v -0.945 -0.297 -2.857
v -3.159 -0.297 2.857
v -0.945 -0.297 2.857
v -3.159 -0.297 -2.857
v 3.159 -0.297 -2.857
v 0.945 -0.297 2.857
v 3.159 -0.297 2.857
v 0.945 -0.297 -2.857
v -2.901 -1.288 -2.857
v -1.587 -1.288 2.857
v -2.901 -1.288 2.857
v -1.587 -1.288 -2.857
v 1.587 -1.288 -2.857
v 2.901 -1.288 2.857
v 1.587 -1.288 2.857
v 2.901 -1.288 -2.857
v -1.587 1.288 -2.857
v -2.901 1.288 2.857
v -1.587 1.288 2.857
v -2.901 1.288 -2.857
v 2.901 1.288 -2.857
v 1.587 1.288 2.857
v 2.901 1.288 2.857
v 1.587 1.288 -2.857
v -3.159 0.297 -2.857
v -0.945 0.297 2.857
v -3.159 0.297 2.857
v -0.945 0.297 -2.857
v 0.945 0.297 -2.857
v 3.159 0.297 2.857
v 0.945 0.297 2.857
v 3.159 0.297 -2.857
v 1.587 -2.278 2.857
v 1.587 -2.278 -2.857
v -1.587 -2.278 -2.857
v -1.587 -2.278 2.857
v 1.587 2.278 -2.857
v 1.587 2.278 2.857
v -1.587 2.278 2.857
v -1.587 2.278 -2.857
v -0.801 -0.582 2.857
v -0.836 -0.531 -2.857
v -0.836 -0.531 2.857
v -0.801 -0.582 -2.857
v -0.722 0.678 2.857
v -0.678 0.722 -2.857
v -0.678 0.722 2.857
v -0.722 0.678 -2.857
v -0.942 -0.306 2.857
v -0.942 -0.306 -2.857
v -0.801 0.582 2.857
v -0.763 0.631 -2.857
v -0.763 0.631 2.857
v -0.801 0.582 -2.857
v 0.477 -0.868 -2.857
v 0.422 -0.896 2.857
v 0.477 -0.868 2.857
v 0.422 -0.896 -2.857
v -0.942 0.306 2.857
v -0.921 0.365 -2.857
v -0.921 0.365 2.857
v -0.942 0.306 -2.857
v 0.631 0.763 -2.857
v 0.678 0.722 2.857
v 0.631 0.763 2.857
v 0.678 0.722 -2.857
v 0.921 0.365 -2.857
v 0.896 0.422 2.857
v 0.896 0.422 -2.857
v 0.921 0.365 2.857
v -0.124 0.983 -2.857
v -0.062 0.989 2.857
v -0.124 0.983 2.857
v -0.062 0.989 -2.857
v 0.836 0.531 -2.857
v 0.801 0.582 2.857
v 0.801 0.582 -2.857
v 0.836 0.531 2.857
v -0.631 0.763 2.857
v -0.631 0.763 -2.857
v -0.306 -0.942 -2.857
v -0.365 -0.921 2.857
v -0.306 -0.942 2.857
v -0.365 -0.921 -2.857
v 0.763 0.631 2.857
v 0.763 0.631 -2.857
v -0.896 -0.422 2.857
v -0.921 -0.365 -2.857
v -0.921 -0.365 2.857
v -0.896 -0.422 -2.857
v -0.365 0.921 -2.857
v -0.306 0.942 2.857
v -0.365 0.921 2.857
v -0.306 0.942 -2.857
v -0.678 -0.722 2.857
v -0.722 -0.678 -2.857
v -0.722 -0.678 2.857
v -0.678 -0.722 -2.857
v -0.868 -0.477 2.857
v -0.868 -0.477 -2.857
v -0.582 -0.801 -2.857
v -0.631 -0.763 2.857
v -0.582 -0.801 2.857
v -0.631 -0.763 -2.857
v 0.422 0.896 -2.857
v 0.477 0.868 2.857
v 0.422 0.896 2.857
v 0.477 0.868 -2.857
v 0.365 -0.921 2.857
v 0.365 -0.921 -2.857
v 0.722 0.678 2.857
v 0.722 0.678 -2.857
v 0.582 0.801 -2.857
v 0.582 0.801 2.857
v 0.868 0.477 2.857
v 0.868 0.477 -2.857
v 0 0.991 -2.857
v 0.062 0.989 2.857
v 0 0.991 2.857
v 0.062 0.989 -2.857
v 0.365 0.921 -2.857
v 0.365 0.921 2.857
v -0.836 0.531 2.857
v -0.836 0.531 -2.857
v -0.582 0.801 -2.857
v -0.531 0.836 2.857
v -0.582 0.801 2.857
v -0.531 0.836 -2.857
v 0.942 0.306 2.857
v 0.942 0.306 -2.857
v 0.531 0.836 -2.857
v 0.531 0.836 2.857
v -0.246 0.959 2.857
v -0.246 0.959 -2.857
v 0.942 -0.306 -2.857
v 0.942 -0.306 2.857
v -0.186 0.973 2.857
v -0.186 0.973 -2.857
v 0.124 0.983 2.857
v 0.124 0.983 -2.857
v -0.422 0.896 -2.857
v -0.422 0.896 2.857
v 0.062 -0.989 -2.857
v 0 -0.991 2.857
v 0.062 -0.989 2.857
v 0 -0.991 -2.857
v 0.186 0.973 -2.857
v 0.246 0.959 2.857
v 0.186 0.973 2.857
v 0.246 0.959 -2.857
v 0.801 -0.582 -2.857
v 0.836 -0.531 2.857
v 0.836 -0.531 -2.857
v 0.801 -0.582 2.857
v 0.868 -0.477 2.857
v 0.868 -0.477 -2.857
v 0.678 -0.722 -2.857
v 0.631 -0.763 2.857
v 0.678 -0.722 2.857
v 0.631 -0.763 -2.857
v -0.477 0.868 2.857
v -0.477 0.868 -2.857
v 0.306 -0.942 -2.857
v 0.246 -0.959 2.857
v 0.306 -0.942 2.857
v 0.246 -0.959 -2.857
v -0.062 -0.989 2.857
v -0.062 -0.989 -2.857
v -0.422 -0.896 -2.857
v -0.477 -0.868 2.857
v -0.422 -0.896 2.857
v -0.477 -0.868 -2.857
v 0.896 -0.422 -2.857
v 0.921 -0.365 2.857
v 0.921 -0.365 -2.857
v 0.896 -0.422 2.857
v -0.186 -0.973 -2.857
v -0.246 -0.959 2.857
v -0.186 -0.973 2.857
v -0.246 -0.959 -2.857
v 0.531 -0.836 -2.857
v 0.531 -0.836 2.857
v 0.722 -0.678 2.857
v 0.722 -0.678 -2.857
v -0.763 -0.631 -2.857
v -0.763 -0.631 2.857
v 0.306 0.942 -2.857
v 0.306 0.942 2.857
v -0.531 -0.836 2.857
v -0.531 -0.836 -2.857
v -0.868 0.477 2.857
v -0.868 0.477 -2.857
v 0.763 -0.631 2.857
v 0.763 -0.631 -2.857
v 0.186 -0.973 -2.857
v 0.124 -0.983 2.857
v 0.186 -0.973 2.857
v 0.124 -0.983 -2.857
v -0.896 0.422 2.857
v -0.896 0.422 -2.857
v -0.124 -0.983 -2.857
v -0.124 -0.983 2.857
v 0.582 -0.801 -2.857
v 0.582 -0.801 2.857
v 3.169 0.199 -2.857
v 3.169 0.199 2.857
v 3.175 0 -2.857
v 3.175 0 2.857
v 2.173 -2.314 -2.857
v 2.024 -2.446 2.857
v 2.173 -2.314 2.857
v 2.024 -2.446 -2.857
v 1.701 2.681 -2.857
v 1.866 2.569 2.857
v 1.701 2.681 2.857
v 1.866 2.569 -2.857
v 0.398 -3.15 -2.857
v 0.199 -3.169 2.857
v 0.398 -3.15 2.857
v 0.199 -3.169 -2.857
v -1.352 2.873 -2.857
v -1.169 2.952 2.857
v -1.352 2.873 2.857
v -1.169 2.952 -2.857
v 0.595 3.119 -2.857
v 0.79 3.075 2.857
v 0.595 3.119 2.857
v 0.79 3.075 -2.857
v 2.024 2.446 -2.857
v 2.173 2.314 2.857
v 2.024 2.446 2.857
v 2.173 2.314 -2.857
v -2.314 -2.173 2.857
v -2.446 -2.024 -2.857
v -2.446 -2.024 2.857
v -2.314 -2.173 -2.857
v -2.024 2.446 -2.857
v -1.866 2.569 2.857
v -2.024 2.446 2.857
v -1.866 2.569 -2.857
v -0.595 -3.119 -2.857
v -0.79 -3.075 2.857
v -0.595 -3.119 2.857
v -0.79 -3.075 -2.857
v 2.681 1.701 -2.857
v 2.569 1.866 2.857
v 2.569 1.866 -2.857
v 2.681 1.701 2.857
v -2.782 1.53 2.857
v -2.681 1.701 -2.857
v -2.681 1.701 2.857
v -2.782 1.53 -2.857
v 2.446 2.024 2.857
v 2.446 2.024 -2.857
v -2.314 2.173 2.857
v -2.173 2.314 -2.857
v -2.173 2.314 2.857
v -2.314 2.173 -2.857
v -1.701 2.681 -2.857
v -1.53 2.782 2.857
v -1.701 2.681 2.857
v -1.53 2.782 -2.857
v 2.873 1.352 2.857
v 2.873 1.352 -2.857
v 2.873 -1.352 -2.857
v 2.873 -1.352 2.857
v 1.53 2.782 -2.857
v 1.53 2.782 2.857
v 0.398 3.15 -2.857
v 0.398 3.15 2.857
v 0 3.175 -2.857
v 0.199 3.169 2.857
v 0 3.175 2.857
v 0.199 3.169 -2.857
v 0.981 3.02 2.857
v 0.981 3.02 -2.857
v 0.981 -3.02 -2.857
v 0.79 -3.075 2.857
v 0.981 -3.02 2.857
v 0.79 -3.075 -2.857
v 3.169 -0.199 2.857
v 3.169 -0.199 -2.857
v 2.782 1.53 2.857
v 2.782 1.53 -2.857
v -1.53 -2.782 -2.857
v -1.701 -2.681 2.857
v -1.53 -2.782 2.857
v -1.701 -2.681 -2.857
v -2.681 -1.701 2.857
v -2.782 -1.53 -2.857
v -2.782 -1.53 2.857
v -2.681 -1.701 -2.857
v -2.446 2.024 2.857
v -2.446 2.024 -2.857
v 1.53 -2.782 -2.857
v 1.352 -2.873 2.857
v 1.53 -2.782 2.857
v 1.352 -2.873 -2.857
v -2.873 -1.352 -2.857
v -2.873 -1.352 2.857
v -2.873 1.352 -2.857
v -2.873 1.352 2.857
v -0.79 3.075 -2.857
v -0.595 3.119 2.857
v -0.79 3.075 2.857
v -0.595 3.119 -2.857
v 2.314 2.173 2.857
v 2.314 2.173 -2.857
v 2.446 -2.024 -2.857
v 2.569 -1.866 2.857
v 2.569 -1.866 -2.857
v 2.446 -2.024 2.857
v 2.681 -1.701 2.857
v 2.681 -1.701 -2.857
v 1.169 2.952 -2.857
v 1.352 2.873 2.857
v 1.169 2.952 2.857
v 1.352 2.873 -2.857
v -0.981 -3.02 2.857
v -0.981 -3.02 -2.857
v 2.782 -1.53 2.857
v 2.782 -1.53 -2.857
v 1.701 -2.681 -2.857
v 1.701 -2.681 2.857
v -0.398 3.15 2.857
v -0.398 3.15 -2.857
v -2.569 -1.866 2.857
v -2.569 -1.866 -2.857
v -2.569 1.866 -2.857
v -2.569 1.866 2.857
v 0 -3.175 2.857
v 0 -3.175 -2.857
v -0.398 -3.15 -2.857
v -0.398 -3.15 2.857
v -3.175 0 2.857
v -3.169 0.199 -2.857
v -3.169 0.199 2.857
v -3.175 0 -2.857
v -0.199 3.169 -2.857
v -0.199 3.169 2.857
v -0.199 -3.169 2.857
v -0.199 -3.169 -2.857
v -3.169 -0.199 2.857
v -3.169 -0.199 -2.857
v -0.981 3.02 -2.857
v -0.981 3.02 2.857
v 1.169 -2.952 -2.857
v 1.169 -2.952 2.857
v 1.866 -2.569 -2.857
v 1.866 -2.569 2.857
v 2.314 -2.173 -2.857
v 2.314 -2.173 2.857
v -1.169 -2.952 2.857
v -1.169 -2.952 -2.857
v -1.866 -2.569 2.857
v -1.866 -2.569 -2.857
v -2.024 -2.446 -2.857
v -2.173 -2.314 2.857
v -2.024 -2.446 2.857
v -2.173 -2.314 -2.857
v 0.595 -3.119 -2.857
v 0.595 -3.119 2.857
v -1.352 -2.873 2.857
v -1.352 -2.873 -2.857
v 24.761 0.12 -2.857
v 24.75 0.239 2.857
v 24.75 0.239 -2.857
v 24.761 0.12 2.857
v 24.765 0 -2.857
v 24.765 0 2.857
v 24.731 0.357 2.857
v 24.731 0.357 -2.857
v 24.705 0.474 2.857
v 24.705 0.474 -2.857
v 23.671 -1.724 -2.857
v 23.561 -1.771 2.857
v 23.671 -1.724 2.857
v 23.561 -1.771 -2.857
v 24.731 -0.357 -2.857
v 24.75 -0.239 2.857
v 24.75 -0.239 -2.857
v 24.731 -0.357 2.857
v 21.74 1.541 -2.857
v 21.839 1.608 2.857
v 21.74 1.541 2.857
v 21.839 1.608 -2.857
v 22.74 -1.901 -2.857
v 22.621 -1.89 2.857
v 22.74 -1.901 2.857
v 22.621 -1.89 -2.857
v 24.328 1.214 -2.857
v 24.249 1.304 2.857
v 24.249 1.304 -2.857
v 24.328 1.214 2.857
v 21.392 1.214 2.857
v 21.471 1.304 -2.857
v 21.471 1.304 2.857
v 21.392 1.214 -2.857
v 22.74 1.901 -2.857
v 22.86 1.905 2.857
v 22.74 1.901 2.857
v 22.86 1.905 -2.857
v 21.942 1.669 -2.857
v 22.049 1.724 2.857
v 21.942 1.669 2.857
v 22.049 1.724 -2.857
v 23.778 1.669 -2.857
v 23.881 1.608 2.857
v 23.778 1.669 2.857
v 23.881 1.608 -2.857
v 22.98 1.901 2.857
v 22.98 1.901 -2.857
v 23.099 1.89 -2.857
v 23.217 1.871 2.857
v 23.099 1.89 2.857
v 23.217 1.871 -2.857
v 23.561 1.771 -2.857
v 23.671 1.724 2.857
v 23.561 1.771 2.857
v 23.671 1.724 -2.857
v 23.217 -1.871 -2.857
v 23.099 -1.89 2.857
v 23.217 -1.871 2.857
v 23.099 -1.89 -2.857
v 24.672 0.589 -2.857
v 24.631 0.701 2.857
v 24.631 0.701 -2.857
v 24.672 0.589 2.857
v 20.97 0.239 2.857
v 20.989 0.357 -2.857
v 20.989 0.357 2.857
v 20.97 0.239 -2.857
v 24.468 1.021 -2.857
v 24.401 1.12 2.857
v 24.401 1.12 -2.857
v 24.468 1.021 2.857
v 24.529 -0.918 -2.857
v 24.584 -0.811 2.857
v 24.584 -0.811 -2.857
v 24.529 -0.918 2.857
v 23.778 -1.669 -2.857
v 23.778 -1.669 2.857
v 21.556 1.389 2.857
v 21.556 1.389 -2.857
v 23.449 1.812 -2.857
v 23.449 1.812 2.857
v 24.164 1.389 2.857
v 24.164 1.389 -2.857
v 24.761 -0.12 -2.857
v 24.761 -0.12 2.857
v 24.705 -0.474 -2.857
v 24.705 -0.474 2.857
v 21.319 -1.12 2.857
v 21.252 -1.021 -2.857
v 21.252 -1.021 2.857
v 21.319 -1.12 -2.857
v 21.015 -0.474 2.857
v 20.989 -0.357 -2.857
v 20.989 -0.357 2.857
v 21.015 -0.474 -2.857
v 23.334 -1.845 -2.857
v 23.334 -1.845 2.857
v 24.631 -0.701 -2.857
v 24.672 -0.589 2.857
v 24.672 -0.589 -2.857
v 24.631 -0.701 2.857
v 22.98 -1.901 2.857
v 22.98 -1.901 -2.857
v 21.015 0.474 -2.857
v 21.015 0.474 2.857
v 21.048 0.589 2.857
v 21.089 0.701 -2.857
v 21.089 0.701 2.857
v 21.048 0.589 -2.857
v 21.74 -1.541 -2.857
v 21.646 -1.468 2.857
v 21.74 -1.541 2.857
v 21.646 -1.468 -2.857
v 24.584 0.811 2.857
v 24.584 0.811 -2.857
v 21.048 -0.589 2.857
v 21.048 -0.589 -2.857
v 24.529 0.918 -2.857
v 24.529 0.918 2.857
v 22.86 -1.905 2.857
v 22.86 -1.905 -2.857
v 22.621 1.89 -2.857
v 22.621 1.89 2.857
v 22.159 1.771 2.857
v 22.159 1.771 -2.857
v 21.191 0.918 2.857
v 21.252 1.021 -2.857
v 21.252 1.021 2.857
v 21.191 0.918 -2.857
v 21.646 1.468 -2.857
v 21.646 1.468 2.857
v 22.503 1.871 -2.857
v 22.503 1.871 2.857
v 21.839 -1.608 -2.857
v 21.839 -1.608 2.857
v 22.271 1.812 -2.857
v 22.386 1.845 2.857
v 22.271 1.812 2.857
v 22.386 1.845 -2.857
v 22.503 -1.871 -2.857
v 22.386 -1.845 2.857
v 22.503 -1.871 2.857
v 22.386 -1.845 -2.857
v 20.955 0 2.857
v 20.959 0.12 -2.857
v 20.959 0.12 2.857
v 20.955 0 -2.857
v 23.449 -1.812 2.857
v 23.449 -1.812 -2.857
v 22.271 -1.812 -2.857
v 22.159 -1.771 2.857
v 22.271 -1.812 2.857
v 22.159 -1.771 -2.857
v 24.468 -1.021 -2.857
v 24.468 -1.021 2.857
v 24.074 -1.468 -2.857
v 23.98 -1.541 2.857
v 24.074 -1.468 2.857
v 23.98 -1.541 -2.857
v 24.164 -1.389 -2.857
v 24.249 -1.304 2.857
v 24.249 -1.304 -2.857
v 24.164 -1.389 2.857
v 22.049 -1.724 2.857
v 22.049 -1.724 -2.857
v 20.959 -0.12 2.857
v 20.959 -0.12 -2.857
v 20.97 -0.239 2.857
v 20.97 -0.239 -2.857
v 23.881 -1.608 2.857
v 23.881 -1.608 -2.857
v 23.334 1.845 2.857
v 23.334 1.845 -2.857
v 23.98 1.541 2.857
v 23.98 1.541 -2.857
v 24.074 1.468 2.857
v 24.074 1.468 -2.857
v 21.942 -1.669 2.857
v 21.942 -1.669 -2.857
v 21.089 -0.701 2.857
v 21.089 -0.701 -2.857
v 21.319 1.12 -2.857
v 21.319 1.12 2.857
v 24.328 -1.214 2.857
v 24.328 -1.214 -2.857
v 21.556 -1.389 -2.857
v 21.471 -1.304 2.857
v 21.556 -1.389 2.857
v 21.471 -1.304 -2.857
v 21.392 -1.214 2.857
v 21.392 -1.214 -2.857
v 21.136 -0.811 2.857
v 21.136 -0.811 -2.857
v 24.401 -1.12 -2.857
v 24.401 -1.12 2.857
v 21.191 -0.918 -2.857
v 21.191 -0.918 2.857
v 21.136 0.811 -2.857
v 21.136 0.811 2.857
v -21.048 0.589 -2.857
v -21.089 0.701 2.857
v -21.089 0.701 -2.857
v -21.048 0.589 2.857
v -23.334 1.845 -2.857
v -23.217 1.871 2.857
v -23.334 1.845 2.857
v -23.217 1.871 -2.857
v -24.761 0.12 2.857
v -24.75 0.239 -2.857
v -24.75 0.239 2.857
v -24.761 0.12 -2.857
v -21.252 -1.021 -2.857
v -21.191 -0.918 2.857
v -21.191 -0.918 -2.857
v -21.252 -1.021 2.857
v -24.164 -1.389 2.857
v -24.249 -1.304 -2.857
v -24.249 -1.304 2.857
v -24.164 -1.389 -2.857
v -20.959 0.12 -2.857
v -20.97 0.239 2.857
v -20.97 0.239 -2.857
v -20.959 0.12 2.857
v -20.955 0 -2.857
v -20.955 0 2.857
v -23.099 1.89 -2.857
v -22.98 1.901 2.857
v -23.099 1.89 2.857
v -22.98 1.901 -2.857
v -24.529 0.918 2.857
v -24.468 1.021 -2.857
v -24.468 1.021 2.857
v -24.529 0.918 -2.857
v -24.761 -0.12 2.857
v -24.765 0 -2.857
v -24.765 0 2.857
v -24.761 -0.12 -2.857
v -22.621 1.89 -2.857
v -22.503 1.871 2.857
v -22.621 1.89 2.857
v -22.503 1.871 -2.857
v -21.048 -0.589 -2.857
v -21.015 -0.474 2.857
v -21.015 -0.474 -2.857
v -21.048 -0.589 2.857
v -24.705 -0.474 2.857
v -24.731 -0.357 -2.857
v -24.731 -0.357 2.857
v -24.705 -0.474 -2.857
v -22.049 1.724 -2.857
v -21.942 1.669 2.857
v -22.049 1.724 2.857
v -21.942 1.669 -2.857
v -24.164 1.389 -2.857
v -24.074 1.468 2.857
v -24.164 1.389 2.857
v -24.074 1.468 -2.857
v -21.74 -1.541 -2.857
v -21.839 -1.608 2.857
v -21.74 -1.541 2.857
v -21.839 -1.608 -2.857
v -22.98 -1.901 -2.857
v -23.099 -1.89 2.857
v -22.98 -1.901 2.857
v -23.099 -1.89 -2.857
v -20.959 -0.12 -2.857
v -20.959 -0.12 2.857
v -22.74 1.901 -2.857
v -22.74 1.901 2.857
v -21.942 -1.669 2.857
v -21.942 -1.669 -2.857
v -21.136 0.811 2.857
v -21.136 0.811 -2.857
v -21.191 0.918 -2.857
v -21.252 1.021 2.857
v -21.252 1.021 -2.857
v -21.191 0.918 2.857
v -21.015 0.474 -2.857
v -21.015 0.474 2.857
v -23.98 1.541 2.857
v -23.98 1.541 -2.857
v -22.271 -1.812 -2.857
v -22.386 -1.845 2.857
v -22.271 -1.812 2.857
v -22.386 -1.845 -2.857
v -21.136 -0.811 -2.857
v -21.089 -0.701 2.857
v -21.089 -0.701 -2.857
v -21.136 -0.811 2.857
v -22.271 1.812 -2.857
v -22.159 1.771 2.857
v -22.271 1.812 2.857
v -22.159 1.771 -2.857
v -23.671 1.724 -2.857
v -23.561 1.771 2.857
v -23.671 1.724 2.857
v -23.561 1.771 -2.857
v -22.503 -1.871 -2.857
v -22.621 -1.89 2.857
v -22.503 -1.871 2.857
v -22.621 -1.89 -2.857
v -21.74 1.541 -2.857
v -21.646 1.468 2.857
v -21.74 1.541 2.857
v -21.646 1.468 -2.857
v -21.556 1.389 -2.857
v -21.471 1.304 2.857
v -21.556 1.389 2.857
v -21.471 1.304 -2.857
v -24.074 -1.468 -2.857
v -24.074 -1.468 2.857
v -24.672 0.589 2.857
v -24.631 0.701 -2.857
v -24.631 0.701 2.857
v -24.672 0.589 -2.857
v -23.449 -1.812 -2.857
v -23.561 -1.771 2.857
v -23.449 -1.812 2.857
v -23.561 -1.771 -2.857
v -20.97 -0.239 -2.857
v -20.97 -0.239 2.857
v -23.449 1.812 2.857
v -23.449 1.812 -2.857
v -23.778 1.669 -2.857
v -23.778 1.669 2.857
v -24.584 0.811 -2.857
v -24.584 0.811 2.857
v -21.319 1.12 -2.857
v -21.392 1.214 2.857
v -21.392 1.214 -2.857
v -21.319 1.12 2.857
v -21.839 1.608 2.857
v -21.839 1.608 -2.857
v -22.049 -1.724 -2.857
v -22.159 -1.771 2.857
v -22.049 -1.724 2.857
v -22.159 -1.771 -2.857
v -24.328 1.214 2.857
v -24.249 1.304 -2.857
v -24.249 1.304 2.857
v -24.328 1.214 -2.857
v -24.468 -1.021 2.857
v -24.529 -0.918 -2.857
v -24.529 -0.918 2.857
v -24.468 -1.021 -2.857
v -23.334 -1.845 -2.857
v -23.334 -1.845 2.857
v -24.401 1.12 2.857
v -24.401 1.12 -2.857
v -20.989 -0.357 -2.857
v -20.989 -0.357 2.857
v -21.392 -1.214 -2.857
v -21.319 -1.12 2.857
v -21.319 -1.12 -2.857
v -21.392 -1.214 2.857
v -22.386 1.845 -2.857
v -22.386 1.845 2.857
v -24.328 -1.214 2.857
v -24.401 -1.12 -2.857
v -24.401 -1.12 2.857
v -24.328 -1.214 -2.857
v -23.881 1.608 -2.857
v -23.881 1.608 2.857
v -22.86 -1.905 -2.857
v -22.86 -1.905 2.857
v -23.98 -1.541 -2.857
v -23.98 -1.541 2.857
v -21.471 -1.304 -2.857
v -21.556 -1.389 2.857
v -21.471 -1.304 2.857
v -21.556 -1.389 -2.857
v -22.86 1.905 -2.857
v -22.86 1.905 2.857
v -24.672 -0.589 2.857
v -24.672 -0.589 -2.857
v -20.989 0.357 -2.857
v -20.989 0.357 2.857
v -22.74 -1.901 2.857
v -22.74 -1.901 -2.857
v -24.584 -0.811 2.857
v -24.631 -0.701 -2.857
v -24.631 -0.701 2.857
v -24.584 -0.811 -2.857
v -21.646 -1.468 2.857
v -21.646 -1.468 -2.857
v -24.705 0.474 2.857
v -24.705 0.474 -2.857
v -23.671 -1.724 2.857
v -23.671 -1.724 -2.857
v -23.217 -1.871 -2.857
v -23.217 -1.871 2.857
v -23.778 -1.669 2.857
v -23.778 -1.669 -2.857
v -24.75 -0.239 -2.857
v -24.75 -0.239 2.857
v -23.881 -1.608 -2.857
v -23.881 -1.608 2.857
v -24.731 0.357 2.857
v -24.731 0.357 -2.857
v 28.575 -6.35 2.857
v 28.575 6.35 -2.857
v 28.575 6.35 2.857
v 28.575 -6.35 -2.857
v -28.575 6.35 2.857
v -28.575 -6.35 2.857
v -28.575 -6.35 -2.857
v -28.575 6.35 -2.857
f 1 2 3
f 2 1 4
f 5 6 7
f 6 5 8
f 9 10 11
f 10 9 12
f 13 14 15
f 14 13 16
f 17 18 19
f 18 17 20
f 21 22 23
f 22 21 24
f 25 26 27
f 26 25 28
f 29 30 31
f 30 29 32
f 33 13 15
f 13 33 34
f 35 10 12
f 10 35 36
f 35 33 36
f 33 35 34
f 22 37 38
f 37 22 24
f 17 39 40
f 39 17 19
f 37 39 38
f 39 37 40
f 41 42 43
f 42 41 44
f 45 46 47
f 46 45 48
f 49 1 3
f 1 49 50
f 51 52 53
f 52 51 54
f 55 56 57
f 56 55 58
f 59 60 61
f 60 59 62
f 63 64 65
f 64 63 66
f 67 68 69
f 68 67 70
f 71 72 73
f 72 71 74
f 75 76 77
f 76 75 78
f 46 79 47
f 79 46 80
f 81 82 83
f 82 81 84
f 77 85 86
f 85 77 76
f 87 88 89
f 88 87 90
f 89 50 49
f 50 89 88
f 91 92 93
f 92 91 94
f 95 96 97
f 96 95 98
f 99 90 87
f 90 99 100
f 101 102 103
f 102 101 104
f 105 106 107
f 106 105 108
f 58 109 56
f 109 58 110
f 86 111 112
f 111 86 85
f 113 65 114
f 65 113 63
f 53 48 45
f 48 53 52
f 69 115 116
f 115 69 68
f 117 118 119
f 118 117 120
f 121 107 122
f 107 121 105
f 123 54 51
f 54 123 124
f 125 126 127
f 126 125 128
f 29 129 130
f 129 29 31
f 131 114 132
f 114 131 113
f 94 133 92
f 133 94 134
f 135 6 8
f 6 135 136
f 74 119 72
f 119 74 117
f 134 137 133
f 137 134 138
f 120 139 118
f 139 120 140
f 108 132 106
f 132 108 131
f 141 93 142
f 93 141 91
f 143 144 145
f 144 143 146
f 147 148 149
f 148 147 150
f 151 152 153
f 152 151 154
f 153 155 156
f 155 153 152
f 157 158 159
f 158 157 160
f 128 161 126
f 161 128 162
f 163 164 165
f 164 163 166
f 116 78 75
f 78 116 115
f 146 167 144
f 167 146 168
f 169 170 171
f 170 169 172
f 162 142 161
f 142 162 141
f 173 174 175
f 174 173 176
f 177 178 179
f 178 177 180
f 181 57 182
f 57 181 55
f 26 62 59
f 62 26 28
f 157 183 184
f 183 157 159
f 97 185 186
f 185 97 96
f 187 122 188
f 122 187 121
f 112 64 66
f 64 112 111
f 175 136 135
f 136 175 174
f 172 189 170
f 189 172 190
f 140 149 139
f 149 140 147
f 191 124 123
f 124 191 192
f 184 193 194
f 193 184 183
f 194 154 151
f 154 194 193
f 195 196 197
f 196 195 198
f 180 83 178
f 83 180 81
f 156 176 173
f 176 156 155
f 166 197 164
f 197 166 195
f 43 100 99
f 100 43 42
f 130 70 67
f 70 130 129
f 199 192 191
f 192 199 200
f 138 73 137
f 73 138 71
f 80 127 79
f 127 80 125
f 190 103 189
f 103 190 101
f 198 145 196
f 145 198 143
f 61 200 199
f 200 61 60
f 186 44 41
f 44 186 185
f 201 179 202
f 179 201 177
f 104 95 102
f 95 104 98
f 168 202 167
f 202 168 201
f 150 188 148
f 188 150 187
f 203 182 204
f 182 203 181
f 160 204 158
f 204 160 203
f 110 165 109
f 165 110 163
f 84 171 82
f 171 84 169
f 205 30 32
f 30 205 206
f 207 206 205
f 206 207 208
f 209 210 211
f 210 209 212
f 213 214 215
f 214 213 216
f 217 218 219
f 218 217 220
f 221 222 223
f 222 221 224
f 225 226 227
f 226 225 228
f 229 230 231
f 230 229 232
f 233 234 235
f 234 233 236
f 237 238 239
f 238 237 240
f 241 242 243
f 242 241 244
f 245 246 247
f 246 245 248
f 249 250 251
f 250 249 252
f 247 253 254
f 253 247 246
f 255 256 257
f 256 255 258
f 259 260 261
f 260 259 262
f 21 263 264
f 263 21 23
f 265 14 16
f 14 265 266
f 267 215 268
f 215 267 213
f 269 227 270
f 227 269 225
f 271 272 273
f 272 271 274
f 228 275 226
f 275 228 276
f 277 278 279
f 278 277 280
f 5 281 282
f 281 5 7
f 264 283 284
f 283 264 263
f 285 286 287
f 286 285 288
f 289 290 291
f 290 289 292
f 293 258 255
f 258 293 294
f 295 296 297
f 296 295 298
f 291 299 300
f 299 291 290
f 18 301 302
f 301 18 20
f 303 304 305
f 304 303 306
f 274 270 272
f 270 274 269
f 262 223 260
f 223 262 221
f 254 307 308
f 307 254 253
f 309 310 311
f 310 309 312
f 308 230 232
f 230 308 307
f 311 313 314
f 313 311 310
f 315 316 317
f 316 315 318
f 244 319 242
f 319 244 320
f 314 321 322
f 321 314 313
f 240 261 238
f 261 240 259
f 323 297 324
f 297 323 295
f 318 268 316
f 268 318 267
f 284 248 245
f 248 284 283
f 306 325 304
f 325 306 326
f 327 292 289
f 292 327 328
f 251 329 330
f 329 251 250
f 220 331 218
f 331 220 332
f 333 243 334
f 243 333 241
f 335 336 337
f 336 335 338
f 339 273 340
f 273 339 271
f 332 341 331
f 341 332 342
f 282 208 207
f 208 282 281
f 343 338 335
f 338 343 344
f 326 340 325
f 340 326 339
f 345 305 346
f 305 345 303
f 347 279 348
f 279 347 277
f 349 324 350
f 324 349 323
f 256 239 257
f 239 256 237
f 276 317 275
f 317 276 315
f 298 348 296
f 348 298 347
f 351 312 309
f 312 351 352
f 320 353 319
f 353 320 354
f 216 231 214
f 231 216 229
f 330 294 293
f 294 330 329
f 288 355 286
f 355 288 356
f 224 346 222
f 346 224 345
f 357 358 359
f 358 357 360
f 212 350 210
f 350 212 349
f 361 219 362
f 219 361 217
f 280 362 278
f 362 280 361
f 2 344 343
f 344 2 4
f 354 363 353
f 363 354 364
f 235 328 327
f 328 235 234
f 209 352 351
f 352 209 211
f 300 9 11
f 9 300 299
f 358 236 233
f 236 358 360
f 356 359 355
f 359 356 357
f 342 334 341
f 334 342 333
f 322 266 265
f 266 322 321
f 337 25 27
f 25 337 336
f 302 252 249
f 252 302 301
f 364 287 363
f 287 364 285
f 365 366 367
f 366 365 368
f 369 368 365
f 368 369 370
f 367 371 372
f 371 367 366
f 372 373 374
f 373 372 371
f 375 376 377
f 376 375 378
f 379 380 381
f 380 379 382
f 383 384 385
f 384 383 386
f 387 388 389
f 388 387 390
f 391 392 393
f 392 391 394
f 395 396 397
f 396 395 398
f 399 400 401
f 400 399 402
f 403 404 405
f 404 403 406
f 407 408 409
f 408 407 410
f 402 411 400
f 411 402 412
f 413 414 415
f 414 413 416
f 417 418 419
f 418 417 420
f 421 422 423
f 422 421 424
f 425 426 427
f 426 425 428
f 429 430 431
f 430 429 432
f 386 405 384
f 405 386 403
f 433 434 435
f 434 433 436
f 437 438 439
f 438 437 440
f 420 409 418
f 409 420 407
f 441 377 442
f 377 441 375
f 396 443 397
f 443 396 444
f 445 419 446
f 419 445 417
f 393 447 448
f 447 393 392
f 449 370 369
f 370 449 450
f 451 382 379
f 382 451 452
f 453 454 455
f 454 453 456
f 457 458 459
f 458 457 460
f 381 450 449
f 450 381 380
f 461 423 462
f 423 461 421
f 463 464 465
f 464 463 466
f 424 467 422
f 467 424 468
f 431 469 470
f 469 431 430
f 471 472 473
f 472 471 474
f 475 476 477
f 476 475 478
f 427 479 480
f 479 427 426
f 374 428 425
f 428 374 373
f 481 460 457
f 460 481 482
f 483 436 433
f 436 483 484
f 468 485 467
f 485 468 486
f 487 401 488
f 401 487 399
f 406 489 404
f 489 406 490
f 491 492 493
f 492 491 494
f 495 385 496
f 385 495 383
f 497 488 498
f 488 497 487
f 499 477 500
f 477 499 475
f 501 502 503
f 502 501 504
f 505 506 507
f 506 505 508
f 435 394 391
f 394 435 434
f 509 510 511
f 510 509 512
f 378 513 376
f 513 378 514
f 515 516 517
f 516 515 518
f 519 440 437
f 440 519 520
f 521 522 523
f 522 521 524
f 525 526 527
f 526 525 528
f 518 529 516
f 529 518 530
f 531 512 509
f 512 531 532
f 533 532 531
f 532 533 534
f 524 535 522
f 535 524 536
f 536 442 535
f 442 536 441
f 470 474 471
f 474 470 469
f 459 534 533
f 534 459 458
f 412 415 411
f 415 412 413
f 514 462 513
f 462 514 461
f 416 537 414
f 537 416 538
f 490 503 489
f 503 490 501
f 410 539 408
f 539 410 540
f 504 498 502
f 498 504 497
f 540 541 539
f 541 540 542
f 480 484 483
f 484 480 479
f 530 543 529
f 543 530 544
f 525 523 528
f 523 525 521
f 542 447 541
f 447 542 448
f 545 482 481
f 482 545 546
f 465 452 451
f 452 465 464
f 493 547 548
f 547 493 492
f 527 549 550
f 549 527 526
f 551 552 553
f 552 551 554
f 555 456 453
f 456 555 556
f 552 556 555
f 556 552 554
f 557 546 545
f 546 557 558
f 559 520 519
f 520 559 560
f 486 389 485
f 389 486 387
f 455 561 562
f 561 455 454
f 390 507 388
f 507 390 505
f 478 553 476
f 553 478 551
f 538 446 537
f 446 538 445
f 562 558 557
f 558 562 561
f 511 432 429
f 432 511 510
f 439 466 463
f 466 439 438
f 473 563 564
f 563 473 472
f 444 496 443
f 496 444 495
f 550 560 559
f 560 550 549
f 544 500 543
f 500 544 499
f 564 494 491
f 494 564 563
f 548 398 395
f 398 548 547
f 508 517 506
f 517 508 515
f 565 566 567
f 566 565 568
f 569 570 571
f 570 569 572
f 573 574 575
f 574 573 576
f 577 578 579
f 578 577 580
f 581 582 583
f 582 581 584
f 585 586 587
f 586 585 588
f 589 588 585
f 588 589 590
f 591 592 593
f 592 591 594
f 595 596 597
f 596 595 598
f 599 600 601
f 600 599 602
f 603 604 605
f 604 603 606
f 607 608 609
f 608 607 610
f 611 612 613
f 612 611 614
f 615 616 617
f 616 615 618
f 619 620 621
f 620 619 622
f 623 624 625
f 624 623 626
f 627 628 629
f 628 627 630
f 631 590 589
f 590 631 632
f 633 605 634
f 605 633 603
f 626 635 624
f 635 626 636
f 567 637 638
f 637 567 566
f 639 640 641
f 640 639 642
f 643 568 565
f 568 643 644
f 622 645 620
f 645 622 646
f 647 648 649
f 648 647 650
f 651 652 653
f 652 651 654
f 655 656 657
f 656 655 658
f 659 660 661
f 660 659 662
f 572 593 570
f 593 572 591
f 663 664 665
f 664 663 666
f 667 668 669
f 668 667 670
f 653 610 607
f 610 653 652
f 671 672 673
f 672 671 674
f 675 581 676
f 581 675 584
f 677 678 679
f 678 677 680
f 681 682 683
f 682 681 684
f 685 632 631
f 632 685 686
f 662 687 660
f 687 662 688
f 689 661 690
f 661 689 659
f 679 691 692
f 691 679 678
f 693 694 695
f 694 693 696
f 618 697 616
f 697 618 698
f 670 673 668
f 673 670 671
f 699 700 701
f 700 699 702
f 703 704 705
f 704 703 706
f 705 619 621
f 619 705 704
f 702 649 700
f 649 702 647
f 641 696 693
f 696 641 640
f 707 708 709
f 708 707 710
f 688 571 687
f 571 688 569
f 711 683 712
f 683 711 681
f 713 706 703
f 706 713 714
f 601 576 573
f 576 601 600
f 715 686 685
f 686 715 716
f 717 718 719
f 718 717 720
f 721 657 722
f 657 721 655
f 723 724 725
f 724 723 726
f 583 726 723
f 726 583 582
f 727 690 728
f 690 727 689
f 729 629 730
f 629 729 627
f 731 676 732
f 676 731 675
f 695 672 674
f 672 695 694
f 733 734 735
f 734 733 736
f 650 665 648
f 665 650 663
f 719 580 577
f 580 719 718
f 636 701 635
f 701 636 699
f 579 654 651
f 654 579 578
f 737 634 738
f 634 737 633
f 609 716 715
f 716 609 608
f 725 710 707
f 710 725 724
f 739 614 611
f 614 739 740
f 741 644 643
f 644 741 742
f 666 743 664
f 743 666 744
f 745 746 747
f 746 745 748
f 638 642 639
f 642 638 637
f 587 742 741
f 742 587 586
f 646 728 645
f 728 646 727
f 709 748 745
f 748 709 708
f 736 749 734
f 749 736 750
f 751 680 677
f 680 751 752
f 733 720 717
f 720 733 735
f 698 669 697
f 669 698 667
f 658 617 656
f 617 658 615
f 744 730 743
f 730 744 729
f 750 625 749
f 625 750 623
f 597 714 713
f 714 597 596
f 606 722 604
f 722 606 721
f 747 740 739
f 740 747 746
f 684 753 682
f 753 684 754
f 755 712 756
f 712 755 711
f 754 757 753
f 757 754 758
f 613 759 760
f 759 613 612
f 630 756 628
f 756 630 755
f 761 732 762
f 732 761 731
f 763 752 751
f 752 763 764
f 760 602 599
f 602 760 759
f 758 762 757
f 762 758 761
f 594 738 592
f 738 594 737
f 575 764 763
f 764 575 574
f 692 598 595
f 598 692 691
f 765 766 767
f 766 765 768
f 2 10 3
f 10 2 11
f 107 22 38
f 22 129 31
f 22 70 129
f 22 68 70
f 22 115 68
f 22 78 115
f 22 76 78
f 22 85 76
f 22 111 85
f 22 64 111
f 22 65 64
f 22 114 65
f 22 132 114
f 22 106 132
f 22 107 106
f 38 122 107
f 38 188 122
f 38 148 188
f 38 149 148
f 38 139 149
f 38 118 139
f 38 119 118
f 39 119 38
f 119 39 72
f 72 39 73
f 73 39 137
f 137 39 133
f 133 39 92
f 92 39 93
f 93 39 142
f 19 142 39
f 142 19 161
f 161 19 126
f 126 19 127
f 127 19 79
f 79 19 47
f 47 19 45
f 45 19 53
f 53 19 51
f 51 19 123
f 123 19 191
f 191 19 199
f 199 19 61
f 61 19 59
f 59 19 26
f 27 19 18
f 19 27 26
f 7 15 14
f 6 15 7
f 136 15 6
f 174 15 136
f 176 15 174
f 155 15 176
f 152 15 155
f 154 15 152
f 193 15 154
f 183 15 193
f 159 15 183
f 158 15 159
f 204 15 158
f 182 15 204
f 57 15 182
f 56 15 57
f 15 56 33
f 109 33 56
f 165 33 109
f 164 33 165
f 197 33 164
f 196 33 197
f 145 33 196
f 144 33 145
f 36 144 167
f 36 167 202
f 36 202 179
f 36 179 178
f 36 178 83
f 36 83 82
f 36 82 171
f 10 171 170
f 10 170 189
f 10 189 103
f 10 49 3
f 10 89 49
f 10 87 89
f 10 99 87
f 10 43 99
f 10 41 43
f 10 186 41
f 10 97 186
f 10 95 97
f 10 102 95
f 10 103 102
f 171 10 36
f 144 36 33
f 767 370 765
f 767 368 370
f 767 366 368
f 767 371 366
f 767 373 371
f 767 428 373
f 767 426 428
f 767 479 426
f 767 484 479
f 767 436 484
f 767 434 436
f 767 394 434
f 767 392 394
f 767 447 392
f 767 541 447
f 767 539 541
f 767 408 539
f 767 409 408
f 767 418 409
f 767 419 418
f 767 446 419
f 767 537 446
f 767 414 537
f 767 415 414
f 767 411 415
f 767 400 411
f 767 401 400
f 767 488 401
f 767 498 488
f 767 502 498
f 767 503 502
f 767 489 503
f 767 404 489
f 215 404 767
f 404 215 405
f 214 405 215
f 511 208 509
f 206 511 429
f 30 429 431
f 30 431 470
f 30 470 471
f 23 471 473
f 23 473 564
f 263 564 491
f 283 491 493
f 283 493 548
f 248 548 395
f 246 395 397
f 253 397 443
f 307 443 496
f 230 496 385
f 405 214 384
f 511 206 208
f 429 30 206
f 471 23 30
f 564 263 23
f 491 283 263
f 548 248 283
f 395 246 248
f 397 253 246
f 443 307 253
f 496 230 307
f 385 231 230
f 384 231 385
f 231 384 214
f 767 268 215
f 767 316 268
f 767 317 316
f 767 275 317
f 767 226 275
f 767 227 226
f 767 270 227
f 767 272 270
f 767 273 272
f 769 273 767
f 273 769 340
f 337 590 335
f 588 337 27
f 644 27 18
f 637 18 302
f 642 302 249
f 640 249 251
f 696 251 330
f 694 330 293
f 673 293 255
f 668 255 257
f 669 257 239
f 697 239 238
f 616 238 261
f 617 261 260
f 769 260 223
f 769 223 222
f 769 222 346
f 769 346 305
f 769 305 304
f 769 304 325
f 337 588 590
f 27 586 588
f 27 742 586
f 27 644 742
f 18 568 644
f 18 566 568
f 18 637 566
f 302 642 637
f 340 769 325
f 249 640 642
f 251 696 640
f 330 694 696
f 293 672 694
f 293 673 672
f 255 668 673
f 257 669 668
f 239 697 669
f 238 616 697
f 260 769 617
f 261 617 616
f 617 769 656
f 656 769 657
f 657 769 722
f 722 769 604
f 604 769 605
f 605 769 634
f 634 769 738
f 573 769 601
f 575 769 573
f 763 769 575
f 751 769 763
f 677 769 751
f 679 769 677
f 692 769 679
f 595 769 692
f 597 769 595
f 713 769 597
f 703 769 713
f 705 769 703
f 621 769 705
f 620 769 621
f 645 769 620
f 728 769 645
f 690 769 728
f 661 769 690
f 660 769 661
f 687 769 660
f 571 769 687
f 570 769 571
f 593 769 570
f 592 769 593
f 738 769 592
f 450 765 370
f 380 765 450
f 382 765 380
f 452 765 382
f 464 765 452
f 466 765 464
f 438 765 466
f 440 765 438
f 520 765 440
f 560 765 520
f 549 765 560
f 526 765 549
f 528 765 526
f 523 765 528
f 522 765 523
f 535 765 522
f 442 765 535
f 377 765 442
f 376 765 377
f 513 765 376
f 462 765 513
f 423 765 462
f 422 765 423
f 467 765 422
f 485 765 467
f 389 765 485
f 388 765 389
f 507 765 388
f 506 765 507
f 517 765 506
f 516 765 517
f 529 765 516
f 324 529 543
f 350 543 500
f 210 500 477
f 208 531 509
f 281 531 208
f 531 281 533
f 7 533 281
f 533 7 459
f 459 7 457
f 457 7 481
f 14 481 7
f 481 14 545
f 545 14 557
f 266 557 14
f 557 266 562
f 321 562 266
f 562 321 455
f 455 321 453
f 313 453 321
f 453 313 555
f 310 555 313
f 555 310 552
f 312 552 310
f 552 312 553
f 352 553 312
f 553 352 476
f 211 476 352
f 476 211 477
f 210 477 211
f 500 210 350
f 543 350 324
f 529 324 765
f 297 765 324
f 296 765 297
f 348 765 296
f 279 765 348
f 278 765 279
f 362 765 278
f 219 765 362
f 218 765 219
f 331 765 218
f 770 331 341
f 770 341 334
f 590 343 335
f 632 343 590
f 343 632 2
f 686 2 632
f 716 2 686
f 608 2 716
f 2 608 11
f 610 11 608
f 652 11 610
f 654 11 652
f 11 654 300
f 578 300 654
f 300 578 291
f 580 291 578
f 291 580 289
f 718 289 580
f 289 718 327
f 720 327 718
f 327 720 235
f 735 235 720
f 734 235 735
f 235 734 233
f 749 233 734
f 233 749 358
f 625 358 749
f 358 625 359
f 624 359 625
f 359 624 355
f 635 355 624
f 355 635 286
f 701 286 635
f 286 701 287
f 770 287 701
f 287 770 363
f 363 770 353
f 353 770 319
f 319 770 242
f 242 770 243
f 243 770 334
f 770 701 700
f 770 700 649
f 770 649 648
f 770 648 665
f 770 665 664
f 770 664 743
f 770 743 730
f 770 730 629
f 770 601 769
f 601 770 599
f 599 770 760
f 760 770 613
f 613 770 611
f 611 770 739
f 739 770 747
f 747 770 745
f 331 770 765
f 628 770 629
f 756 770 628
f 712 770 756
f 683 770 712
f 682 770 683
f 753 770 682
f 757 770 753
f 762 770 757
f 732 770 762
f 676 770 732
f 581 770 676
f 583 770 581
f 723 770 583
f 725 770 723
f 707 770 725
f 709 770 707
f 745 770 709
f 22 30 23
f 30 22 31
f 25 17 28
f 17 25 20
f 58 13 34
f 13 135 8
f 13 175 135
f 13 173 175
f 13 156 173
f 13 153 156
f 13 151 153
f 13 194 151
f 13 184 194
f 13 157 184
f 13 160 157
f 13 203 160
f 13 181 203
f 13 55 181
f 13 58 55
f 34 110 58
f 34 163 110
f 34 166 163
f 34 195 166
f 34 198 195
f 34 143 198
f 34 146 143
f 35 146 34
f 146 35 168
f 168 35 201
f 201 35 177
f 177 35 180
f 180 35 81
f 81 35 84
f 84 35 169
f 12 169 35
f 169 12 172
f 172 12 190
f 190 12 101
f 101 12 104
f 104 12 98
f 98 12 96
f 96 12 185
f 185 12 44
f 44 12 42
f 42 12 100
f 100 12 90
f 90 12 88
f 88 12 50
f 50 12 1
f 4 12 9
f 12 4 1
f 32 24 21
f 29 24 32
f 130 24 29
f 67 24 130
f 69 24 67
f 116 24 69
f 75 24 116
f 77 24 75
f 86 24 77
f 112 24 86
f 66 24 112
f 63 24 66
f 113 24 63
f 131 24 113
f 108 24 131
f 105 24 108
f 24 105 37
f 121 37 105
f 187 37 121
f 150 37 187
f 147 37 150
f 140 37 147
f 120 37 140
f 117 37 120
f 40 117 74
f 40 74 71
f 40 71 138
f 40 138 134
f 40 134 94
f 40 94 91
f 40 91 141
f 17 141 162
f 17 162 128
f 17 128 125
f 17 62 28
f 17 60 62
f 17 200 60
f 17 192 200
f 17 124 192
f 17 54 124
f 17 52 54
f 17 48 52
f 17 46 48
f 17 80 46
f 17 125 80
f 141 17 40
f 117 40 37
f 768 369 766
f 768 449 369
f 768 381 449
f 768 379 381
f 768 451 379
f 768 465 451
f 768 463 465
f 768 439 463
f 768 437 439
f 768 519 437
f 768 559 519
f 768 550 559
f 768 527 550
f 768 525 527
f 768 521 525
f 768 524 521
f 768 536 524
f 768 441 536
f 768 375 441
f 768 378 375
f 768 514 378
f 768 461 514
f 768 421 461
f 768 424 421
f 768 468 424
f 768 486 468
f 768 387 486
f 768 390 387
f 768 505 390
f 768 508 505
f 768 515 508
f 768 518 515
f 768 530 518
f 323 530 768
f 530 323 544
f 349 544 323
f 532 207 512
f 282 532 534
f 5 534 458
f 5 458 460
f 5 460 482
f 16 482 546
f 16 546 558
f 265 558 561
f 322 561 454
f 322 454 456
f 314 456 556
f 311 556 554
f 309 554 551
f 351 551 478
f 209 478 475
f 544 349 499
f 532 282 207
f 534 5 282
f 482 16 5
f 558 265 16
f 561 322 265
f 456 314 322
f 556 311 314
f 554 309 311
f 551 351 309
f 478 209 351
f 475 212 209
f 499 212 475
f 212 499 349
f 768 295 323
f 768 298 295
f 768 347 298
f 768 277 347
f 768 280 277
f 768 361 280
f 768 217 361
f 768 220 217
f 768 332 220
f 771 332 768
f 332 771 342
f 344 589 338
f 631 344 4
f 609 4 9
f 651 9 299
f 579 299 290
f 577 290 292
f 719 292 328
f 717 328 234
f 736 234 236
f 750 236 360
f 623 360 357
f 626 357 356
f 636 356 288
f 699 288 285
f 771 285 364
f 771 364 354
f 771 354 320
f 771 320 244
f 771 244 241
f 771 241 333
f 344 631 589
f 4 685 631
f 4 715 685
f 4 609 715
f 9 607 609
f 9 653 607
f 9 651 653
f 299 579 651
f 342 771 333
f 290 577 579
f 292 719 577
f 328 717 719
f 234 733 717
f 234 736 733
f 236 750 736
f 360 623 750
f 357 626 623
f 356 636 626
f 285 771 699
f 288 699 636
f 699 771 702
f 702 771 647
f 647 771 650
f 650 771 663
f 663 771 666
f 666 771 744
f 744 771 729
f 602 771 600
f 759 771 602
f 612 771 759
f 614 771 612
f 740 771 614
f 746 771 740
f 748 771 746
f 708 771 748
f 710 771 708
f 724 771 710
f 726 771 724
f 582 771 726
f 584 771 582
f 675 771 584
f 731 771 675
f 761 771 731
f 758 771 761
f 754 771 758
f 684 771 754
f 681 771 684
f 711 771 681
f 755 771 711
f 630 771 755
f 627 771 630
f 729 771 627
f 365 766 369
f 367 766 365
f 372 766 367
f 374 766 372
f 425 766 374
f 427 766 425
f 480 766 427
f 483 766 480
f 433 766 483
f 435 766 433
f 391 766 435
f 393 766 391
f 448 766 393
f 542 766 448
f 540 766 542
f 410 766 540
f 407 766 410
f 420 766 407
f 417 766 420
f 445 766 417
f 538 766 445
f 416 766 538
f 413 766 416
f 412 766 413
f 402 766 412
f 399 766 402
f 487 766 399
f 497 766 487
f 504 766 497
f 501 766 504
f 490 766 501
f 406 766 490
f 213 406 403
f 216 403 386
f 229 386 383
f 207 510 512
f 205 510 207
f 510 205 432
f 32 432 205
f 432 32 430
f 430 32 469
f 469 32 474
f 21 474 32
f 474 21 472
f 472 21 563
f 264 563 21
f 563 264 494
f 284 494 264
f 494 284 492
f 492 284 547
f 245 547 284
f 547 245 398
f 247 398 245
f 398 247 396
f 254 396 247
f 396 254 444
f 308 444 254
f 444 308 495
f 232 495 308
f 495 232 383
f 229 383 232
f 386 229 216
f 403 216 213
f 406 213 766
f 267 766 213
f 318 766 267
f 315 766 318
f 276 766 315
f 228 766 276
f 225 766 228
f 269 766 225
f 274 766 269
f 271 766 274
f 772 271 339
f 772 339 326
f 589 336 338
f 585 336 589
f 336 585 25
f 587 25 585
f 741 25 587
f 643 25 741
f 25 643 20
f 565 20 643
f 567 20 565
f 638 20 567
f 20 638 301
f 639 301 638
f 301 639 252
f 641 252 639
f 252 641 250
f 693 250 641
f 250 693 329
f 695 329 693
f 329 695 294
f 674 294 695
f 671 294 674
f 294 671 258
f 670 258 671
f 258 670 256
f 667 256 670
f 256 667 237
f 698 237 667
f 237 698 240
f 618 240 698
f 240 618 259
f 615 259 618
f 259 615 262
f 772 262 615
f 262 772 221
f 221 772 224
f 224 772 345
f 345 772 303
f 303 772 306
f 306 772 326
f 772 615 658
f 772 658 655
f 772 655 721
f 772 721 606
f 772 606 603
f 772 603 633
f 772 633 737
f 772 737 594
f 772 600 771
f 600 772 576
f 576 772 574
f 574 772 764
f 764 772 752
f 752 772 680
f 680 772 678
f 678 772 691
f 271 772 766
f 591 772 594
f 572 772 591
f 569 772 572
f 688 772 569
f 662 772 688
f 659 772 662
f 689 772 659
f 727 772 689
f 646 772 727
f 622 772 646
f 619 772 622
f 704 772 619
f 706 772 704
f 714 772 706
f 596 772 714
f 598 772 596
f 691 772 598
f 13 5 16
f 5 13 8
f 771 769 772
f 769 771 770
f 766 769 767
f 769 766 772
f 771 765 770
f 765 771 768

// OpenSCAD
$fn=100;

// All dimensions in inches

Span = 2.25;
Width = 0.5;
Thickness = 0.225;
WeightHole = 0.15; 

Shaft = 0.078;
SpringDia = 0.25; 

module bar()
{
  cube([Span, Width, Thickness], true);
}


module shaftHole()
{
  difference() {
    cylinder(d = SpringDia, h = Thickness * 4, center=true);
    difference() {
      union() {
        translate([0, -Shaft * 0.4, 0]) cube([SpringDia * 2, Shaft * 0.5, Thickness * 4], true);
        translate([0, Shaft * 0.4, 0]) cube([SpringDia * 2, Shaft * 0.5, Thickness * 4], true);
        translate([0, -Shaft * 0.65, 0]) cube([SpringDia * 0.5, Shaft, Thickness * 4], true);
        translate([0, Shaft * 0.65, 0]) cube([SpringDia * 0.5, Shaft, Thickness * 4], true);
      }
      cylinder(d = Shaft, h = Thickness * 4, center=true);
    }
  }
}

module weightHoles()
{
  union() {
    translate([2 * Span / 5, 0, 0]) cylinder(d = WeightHole, h = Thickness * 4, center = true);
    translate([-2 * Span / 5, 0, 0]) cylinder(d = WeightHole, h = Thickness * 4, center = true);        
  }
}

scale([25.4, 25.4, 25.4]) {
  difference() {
    bar();
    union() {
      shaftHole();
      weightHoles();
    }
  }
}
